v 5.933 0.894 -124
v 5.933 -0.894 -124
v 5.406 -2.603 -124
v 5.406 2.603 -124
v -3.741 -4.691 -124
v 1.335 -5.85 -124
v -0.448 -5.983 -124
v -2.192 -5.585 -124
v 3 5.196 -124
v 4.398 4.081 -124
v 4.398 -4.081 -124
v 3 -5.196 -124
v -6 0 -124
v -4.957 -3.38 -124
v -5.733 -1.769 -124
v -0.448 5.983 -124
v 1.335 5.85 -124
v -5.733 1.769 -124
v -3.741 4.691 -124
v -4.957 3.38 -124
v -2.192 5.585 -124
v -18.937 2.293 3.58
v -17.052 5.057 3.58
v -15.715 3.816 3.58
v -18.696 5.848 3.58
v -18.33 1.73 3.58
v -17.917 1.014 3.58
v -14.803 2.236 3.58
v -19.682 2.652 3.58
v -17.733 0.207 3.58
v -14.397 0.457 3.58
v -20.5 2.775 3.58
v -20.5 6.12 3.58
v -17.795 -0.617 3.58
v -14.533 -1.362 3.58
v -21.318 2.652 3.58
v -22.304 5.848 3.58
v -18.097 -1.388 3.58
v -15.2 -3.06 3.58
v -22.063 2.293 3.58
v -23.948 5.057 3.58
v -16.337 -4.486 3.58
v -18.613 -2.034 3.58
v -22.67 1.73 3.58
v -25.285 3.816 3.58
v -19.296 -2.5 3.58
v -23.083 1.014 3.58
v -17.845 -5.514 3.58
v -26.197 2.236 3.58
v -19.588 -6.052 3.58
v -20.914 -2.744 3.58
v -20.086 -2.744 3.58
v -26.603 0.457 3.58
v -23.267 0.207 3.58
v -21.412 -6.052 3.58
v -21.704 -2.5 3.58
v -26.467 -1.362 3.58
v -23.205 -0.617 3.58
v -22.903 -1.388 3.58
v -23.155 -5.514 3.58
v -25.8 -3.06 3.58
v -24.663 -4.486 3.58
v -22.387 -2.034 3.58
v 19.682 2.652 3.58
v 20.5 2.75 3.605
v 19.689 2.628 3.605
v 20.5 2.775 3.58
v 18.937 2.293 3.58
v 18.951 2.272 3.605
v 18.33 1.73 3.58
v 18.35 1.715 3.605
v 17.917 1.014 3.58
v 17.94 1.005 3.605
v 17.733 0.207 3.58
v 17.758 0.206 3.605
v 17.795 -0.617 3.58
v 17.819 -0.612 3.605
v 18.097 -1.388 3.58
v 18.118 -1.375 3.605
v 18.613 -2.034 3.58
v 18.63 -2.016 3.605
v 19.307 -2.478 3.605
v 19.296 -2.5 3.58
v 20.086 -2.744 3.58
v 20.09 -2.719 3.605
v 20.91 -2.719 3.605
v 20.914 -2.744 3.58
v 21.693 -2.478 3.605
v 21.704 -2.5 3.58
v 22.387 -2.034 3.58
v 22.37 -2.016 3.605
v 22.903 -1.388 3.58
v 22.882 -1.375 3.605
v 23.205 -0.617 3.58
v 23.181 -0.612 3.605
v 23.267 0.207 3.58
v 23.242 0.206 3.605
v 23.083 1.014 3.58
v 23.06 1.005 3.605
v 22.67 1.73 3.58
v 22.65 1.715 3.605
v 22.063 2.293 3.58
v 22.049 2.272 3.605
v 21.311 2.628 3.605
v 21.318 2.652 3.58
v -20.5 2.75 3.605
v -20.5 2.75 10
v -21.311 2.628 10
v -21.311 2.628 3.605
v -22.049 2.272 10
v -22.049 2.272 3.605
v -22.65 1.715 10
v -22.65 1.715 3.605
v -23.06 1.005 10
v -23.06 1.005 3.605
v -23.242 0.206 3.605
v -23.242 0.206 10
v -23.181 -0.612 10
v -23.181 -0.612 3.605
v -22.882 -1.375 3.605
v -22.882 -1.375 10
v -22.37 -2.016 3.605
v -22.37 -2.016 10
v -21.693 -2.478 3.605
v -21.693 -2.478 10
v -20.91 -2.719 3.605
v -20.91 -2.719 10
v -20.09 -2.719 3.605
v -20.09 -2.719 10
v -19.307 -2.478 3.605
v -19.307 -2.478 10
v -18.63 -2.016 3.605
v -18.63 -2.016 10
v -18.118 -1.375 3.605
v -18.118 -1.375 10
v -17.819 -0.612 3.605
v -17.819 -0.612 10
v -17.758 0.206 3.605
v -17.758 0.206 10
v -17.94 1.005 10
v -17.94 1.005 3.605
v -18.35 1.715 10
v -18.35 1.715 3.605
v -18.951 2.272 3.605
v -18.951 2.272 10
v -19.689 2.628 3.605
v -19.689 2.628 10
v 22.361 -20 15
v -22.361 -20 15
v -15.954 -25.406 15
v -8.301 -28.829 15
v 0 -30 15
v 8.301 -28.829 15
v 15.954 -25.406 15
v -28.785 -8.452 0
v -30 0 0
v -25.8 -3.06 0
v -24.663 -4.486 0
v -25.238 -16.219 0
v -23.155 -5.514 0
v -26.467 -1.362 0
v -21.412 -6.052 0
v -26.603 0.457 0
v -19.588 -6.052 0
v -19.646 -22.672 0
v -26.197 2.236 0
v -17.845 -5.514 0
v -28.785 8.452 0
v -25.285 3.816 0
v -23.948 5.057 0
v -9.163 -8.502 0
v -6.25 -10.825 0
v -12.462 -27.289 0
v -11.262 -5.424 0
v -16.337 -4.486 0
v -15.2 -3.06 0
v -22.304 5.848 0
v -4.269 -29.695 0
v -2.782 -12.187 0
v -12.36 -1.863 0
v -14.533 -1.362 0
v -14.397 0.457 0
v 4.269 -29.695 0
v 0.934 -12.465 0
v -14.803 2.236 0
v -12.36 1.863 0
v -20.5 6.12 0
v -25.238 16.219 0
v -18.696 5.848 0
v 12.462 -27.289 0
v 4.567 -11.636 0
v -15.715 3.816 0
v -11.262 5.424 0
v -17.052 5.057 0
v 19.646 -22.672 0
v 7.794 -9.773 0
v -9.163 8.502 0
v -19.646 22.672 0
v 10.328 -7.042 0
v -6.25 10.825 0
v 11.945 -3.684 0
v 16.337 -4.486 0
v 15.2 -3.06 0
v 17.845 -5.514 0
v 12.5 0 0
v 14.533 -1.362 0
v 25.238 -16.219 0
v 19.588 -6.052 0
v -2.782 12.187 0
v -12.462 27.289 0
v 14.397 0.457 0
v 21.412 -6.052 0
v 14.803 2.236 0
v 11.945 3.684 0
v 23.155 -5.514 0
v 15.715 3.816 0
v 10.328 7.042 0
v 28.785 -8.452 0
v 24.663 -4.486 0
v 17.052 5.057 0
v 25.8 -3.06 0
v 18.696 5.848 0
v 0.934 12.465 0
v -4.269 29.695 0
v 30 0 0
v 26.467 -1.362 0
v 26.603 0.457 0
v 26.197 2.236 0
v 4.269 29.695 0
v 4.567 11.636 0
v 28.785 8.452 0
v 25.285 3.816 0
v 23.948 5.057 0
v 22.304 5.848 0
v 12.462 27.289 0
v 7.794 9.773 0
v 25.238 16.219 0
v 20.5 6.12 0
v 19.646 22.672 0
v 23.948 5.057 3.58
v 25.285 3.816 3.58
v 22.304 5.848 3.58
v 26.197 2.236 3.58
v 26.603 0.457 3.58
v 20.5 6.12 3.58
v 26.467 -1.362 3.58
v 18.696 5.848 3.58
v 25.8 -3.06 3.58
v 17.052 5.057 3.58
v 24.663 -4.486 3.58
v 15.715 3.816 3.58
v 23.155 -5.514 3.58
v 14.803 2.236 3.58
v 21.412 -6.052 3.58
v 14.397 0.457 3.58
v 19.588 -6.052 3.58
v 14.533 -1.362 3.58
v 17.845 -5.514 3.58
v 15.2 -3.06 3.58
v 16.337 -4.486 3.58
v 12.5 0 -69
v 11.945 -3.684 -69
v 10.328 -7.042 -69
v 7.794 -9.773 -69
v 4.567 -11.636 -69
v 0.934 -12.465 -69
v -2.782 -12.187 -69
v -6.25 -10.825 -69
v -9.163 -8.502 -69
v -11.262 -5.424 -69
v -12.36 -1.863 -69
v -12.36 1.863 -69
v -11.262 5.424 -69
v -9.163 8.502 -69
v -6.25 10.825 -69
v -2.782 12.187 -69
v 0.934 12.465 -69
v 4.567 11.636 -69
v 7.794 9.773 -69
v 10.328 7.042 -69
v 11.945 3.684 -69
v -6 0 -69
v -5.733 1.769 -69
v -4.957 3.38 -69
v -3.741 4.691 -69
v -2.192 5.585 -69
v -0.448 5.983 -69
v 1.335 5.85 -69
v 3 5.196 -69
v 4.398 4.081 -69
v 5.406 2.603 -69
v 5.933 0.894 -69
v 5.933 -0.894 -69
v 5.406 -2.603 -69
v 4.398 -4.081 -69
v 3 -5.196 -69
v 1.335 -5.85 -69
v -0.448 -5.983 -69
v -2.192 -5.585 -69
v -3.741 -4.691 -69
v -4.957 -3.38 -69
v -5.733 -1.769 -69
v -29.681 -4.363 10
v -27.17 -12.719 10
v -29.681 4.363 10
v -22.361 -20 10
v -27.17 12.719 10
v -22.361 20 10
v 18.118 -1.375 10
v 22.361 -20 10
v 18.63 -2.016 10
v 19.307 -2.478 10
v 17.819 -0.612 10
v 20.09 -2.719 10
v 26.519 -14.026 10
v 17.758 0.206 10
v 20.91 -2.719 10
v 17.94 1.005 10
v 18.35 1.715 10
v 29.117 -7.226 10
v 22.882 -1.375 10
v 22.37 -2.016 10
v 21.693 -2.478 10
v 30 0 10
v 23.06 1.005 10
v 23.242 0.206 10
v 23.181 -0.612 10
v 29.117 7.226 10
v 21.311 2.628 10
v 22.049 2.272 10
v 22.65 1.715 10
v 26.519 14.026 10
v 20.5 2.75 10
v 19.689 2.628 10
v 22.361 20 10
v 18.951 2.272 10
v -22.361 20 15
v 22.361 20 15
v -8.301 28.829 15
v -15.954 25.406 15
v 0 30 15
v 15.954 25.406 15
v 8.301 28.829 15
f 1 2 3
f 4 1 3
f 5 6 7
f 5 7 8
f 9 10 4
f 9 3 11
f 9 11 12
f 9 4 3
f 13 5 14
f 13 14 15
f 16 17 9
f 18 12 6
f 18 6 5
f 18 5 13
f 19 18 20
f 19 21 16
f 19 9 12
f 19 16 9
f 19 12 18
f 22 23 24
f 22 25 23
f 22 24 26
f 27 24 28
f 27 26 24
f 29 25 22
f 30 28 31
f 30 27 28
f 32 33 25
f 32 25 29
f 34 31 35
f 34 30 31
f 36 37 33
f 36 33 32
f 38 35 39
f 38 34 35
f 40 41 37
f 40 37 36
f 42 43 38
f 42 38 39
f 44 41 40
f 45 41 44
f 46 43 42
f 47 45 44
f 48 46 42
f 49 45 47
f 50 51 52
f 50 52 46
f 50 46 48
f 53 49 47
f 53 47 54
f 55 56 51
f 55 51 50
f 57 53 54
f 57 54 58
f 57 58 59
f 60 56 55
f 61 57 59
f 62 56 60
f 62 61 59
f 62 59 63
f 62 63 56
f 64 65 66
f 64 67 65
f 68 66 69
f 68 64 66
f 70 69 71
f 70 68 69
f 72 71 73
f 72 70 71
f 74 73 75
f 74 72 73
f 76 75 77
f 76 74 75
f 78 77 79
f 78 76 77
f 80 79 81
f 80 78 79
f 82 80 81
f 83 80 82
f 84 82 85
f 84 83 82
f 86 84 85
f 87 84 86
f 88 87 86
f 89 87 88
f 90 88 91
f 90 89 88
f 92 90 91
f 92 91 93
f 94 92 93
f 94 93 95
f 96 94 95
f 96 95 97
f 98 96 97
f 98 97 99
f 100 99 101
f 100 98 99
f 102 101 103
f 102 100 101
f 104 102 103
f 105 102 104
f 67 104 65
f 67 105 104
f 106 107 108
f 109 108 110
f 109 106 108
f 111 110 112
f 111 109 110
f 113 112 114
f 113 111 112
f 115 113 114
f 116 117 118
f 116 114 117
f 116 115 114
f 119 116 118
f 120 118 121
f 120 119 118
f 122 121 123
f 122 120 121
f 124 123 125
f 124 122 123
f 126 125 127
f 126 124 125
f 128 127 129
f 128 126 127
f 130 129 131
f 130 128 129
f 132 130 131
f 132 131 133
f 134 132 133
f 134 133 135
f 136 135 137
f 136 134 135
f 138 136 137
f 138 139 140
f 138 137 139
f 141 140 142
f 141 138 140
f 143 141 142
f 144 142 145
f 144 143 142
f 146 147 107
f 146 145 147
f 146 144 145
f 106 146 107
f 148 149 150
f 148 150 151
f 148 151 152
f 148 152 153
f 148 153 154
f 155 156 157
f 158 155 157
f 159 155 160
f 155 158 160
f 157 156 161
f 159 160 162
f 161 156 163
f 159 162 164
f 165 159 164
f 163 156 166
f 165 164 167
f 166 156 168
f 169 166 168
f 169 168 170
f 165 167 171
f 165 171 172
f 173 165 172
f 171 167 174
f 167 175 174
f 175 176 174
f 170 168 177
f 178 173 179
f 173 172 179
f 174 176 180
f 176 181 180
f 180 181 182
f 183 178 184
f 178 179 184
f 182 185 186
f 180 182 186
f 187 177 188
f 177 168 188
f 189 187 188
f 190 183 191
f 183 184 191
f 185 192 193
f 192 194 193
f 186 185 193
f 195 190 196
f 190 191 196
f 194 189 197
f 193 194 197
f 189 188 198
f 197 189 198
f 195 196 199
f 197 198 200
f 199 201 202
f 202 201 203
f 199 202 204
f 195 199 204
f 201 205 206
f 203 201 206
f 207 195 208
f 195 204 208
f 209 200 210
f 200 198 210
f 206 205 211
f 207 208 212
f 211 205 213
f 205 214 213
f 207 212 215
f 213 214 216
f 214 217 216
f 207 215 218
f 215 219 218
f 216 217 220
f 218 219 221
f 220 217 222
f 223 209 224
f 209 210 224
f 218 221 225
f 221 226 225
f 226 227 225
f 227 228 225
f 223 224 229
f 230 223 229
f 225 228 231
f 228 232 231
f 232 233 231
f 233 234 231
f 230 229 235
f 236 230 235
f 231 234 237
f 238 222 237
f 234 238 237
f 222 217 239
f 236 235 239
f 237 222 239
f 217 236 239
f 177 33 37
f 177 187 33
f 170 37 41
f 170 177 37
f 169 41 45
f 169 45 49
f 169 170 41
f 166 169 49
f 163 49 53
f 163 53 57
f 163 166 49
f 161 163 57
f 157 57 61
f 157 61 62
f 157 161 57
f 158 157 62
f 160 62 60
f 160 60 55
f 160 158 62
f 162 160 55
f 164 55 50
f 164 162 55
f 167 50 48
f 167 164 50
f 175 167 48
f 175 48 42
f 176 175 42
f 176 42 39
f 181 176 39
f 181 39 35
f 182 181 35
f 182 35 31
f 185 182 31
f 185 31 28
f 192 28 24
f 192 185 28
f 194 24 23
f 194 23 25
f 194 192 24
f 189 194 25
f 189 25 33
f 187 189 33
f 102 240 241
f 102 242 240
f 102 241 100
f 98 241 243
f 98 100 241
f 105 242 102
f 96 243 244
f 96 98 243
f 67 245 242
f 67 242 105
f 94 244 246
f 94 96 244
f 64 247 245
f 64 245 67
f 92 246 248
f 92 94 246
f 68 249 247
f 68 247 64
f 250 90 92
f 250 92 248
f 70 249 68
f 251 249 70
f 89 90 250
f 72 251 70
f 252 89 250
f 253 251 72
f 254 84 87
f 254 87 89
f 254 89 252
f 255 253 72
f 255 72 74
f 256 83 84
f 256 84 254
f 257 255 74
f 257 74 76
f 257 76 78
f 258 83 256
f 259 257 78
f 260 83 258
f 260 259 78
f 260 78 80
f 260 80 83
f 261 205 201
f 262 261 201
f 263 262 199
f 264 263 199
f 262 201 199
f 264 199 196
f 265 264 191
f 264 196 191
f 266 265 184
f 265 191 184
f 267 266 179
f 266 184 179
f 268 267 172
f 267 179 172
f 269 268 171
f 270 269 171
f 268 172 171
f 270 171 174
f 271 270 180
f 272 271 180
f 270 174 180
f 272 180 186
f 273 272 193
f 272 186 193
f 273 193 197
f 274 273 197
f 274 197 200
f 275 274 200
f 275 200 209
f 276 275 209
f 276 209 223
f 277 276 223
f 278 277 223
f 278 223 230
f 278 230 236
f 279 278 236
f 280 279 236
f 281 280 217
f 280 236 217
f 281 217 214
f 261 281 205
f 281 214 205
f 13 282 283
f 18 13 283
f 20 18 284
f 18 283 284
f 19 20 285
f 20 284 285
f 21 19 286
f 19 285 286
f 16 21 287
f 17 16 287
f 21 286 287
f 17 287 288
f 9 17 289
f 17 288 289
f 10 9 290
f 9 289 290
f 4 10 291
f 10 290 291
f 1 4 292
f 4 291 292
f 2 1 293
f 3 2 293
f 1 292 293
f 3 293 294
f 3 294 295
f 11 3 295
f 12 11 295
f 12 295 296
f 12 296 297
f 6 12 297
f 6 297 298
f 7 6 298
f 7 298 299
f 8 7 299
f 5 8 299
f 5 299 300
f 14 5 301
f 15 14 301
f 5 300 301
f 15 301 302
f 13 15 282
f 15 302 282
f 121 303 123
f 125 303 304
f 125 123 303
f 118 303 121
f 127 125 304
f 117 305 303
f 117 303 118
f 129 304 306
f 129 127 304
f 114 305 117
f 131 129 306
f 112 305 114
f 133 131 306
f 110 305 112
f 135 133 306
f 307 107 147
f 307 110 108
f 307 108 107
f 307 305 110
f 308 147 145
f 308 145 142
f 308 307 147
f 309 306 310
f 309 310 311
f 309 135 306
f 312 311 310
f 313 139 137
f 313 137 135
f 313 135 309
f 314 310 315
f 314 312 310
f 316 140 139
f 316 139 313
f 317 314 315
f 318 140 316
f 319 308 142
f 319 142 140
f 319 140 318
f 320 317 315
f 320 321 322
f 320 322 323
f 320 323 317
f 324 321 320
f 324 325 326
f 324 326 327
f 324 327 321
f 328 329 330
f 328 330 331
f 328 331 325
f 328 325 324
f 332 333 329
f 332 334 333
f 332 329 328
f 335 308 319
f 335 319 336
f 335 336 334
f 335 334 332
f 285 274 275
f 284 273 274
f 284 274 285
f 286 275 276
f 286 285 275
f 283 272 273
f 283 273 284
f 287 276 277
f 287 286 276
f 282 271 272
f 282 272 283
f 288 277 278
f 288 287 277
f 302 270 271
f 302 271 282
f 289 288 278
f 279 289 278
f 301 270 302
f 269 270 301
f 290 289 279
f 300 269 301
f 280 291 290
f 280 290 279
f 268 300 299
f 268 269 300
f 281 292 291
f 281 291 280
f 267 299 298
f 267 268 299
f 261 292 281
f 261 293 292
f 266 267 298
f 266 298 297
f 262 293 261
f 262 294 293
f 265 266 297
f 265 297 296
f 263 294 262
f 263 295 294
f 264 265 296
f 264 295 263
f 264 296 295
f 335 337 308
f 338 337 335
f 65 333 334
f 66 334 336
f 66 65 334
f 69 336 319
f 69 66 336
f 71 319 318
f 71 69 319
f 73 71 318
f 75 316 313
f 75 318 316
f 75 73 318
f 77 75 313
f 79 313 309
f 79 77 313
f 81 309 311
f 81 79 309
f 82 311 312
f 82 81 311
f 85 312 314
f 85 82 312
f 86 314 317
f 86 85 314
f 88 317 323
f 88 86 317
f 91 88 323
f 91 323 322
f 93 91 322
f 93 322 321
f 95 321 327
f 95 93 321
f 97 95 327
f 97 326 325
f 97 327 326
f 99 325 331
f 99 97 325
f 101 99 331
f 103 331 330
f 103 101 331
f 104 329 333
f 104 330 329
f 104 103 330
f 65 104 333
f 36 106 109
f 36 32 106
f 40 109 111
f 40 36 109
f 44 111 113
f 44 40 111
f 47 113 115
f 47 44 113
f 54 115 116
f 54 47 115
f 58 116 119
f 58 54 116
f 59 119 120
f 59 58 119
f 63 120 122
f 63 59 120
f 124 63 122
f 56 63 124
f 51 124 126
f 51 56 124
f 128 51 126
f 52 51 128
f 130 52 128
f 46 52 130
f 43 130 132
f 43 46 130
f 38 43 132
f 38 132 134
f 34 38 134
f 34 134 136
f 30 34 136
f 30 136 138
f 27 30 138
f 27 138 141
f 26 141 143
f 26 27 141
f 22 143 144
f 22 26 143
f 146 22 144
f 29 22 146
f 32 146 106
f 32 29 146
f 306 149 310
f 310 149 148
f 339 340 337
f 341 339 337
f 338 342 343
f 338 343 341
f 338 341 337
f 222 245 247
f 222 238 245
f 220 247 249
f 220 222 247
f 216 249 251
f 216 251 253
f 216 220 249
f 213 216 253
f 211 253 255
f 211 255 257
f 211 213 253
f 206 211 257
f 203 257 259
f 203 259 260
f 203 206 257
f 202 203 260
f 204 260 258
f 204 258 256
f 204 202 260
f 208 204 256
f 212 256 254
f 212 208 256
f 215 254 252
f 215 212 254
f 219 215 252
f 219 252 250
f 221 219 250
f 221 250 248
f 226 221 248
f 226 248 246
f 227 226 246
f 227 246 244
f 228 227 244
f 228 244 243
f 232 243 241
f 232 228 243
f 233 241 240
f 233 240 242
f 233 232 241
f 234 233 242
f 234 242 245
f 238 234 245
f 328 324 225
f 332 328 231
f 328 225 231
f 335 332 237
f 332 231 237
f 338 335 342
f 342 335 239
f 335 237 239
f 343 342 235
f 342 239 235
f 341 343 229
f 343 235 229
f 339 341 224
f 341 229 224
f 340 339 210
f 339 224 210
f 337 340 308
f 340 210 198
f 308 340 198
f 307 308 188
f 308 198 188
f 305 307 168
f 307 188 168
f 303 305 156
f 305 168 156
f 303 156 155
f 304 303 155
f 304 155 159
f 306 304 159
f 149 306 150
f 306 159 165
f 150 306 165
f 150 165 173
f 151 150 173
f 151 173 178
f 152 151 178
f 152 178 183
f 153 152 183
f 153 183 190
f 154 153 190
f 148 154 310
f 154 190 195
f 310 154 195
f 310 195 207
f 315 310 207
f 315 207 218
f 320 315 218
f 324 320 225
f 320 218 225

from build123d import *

# Parameters (mm, degrees)
ESQUISSE1_R                                = 30
BOSS_EXTRU_1_DEPTH                         = 15
ESQUISSE2_R                                = 12.5
BOSS_EXTRU_2_DEPTH                         = 69
ESQUISSE4_2_W                              = 230
ESQUISSE4_2_H                              = 40
ENL_V_MAT_EXTRU_1_DEPTH                    = 5
CHAMBRAGE_POUR_VIS_T_TE_HEXAGONALE_2_COUNT = 2
CHAMBRAGE_POUR_VIS_T_TE_HEXAGONALE_2_PITCH = 41
ESQUISSE17_R                               = 6
BOSS_EXTRU_4_DEPTH                         = 55


with BuildPart() as part:
    # Esquisse1 → Boss.-Extru.1 (new body)
    with BuildSketch(Plane.XY):
        Circle(ESQUISSE1_R)
    extrude(amount=BOSS_EXTRU_1_DEPTH)

    # Esquisse2 → Boss.-Extru.2 (add)
    with BuildSketch(Plane(origin=(0, 0, 0), x_dir=(-1, 0, 0), z_dir=(0, 0, -1))):
        Circle(ESQUISSE2_R)
    extrude(amount=BOSS_EXTRU_2_DEPTH)

    # Esquisse4<2> → Enlèv. mat.-Extru.1 (cut)
    with BuildSketch(Plane.XY.offset(15)):
        Rectangle(ESQUISSE4_2_W, ESQUISSE4_2_H)
    extrude(amount=-ENL_V_MAT_EXTRU_1_DEPTH, mode=Mode.SUBTRACT)

    # Esquisse14 → Chambrage pour vis à tête hexagonale M51 (revolve, cut)
    with BuildSketch(Plane.YZ.offset(-20.5)):
        Polygon((0, 0), (0, 15), (2.75, 15), (2.75, 3.605), (2.775, 3.58), (6.12, 3.58), (6.12, 0), align=None)
    chambrage_pour_vis_t_te_hexagonale_m51 = revolve(axis=Axis((-20.5, 0, -6.35), (0, 0, 1)), mode=Mode.SUBTRACT)

    # Chambrage pour vis _ t_te hexagonale 2: Chambrage pour vis à tête hexagonale M51 ×2
    with Locations(*[(i * CHAMBRAGE_POUR_VIS_T_TE_HEXAGONALE_2_PITCH, 0, 0) for i in range(1, CHAMBRAGE_POUR_VIS_T_TE_HEXAGONALE_2_COUNT)]):
        add(chambrage_pour_vis_t_te_hexagonale_m51, mode=Mode.SUBTRACT)

    # Esquisse17 → Boss.-Extru.4 (add)
    with BuildSketch(Plane(origin=(0, 0, -69), x_dir=(-1, 0, 0), z_dir=(0, 0, -1))):
        Circle(ESQUISSE17_R)
    extrude(amount=BOSS_EXTRU_4_DEPTH)


solid = part.part
